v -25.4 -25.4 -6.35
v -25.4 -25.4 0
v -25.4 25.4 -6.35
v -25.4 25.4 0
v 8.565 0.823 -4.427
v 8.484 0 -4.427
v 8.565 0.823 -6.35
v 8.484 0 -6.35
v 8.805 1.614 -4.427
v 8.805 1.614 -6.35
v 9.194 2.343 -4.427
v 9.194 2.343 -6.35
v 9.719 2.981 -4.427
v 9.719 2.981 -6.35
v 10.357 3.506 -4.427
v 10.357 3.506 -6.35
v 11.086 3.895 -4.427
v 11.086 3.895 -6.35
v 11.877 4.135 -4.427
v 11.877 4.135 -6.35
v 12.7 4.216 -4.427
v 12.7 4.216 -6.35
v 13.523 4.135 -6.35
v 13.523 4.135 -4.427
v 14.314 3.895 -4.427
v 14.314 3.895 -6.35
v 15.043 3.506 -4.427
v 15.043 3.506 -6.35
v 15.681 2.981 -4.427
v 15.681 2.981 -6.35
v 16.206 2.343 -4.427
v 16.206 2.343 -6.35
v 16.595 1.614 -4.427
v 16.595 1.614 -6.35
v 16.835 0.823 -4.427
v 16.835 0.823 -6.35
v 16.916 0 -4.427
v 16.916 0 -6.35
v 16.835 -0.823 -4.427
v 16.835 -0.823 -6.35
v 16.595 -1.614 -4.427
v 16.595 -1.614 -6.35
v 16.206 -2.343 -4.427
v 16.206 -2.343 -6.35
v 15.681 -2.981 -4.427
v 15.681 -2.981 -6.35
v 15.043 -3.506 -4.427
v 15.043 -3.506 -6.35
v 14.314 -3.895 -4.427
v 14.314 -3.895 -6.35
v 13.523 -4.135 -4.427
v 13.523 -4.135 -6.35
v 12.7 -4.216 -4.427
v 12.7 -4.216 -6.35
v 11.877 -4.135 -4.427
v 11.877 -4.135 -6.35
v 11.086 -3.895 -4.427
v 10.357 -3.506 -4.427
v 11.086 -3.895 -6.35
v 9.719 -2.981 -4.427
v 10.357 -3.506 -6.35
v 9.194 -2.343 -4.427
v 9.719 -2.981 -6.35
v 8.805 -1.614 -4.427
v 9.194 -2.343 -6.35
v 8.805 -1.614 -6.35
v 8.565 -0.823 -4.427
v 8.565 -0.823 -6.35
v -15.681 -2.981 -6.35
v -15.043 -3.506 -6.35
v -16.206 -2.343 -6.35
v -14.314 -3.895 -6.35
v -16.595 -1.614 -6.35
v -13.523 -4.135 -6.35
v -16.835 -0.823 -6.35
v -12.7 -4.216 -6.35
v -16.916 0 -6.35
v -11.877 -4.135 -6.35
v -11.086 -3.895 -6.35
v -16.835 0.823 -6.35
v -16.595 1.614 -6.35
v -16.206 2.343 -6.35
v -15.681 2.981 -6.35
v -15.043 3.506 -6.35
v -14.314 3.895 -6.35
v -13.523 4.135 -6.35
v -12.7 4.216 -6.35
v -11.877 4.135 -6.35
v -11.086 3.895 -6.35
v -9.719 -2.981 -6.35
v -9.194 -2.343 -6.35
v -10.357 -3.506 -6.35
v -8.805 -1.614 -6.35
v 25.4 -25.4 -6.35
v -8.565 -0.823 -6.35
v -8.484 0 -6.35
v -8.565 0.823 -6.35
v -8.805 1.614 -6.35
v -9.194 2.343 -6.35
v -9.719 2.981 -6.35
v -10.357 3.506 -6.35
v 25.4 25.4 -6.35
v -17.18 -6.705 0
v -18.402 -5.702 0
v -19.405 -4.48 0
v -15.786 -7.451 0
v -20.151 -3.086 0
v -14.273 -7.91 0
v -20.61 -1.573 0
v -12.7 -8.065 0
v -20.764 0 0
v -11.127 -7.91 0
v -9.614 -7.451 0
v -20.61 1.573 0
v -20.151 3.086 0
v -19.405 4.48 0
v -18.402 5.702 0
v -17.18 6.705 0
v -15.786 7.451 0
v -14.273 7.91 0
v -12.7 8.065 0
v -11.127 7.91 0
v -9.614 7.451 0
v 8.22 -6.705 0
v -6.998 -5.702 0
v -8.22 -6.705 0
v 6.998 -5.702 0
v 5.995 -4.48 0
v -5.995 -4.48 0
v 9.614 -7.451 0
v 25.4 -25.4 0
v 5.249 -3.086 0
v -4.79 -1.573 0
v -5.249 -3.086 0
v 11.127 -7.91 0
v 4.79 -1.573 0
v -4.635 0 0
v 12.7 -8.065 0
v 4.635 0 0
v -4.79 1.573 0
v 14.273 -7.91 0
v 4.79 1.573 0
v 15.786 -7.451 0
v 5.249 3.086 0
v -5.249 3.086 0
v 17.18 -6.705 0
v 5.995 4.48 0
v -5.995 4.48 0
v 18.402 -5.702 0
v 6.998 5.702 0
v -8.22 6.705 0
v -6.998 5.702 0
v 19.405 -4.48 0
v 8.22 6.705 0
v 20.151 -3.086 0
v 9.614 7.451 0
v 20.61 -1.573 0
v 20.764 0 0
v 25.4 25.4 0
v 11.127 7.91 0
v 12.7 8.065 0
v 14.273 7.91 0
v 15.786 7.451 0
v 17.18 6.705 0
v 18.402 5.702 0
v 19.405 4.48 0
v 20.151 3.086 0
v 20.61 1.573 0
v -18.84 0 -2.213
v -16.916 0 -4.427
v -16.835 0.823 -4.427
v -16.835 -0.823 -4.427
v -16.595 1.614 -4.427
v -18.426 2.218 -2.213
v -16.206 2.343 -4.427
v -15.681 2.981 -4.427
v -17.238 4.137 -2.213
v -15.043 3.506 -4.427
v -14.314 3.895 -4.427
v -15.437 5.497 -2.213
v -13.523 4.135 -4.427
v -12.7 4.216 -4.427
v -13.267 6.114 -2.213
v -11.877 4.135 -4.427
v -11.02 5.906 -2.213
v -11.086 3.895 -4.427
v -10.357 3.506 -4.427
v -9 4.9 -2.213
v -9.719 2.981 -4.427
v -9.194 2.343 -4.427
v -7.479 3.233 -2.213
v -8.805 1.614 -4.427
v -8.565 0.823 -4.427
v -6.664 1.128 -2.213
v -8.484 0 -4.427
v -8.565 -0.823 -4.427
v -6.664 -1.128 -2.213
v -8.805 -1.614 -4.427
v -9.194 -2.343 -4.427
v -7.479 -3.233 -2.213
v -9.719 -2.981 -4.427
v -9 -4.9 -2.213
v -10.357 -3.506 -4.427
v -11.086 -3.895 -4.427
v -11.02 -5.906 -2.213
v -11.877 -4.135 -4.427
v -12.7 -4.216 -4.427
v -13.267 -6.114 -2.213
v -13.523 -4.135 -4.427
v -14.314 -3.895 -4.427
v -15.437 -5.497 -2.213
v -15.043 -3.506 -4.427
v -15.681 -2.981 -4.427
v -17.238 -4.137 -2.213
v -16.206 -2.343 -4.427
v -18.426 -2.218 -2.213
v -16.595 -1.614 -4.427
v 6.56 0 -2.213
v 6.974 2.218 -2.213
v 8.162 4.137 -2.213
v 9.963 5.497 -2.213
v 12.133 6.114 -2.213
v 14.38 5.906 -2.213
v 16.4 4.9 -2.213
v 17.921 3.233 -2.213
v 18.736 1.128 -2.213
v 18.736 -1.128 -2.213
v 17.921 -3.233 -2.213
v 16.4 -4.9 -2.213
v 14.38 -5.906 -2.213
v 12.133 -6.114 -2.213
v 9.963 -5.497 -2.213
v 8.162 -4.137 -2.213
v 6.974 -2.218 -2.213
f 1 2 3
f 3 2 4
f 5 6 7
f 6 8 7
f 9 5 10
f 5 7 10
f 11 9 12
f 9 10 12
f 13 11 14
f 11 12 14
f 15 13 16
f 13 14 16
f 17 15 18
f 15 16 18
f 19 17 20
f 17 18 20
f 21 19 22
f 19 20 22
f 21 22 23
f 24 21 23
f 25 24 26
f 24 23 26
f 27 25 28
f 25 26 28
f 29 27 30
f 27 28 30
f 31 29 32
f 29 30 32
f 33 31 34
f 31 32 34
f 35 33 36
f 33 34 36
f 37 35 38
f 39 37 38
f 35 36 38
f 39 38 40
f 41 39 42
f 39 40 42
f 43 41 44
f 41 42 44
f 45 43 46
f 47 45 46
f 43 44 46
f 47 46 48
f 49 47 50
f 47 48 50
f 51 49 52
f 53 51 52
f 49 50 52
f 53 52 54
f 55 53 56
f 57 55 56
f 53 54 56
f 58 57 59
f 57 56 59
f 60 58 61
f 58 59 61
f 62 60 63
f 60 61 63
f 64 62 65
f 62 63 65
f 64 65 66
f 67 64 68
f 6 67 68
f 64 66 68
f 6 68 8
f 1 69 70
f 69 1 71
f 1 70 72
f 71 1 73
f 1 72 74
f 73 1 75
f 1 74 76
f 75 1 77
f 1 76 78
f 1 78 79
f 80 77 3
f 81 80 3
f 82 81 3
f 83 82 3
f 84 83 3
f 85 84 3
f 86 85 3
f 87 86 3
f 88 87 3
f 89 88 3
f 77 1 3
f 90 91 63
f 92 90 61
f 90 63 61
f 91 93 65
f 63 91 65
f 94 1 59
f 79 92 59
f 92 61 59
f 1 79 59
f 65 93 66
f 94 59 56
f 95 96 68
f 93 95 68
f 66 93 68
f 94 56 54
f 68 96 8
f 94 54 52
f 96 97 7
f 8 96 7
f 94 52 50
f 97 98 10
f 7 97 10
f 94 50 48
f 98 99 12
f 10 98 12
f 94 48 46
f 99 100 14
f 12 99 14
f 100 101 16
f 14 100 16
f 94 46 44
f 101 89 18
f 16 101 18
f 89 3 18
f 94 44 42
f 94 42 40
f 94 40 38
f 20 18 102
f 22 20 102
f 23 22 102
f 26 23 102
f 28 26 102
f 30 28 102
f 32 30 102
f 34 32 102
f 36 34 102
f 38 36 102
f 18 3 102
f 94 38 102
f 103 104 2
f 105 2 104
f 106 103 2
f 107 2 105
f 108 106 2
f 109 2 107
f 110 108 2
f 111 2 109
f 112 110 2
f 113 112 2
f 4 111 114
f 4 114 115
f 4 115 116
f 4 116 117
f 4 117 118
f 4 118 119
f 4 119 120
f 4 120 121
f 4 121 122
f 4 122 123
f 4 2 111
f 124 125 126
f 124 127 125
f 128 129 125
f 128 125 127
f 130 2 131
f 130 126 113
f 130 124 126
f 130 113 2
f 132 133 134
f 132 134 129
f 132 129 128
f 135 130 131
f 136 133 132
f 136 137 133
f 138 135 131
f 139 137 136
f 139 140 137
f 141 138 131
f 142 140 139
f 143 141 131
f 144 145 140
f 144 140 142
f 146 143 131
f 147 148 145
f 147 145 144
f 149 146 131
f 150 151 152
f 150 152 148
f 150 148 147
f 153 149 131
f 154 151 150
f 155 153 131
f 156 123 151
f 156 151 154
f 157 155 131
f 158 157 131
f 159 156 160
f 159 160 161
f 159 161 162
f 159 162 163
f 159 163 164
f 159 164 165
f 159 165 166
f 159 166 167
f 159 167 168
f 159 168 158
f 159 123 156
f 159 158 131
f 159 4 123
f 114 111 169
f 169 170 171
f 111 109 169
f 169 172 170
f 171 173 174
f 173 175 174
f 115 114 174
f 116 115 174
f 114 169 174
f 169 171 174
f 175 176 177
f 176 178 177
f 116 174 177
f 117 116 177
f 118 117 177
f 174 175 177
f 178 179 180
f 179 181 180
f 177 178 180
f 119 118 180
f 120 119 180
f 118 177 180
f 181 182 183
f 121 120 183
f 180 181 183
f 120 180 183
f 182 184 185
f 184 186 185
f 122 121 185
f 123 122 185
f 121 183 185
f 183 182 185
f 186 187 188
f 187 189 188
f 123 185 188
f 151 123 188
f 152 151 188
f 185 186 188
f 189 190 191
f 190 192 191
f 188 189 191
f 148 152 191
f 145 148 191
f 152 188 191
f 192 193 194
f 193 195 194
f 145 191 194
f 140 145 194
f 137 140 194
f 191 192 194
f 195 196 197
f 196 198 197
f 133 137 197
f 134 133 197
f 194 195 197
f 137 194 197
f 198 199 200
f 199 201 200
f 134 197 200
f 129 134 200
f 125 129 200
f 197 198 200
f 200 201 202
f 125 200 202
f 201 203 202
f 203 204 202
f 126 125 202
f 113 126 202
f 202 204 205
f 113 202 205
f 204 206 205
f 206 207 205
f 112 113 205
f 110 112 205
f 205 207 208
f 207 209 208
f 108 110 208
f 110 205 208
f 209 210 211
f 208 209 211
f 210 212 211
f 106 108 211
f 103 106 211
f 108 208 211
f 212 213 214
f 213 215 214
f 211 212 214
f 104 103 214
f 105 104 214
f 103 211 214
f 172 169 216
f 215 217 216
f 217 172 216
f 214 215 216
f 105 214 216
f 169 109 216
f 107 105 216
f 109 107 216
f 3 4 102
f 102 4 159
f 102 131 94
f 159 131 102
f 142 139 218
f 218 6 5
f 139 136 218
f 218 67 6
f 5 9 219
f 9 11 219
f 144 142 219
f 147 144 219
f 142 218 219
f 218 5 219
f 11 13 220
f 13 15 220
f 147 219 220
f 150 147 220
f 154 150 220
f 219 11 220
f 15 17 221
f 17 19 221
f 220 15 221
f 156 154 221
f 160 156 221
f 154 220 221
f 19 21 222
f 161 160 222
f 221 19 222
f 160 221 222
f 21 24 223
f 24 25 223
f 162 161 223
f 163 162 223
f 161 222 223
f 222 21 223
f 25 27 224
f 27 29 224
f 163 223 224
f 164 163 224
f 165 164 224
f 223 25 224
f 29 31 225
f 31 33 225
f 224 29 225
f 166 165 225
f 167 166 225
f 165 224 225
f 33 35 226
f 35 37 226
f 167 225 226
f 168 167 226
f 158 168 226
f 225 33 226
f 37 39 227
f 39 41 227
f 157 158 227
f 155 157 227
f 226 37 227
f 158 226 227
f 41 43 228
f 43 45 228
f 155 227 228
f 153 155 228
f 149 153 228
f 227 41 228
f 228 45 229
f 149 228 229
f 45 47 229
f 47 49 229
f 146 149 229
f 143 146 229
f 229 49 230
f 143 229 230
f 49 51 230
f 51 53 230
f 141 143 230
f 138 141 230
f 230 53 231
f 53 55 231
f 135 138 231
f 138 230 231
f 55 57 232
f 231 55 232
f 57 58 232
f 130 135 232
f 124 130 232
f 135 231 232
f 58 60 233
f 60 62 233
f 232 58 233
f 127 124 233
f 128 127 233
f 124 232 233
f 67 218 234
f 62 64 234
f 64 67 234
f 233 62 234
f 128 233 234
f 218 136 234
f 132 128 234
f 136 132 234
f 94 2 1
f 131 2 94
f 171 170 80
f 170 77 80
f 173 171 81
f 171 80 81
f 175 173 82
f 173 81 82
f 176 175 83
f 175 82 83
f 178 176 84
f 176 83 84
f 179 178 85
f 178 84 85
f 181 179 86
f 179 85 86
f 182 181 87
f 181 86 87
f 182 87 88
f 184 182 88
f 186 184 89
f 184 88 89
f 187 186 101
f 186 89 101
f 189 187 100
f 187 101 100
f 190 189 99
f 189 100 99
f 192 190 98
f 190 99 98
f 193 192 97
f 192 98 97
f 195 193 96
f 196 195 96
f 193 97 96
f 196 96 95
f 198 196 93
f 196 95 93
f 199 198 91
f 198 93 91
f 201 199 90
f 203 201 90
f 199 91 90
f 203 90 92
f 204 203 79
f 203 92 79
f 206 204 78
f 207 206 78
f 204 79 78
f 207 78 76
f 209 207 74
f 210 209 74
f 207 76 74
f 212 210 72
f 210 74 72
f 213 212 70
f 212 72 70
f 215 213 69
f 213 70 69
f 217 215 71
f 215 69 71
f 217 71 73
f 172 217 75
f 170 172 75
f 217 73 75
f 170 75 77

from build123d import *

# Parameters (mm, degrees)
SKETCH1_W                                         = 50.8
SKETCH1_H                                         = 50.8
SKETCH1_R                                         = 3.2639
BOSS_EXTRUDE1_DEPTH                               = 6.35
CSK_FOR_5_16_FLAT_HEAD_MACHINE_SCREW1_D           = 8.4328
CSK_FOR_5_16_FLAT_HEAD_MACHINE_SCREW1_DEPTH       = 32.766
CSK_FOR_5_16_FLAT_HEAD_MACHINE_SCREW1_CSINK_D     = 16.129
CSK_FOR_5_16_FLAT_HEAD_MACHINE_SCREW1_CSINK_ANGLE = 82
CSK_FOR_5_16_FLAT_HEAD_MACHINE_SCREW1_TIP         = 2.533468714


with BuildPart() as part:
    # Sketch1 → Boss-Extrude1 (new body)
    with BuildSketch(Plane.XY):
        Rectangle(SKETCH1_W, SKETCH1_H)
        with Locations((-12.7, 0)):
            Circle(SKETCH1_R, mode=Mode.SUBTRACT)
        with Locations((12.7, 0)):
            Circle(SKETCH1_R, mode=Mode.SUBTRACT)
    extrude(amount=-BOSS_EXTRUDE1_DEPTH)

    # CSK for 5/16 Flat Head Machine Screw1
    with Locations(Plane(origin=(-12.7, 0, 0), x_dir=(1, 0, 0), z_dir=(0, 0, 1))):
        with Locations((0, 0), (25.4, 0)):
            CounterSinkHole(CSK_FOR_5_16_FLAT_HEAD_MACHINE_SCREW1_D / 2, CSK_FOR_5_16_FLAT_HEAD_MACHINE_SCREW1_CSINK_D / 2, depth=CSK_FOR_5_16_FLAT_HEAD_MACHINE_SCREW1_DEPTH, counter_sink_angle=CSK_FOR_5_16_FLAT_HEAD_MACHINE_SCREW1_CSINK_ANGLE)
            with Locations((0, 0, -(CSK_FOR_5_16_FLAT_HEAD_MACHINE_SCREW1_DEPTH + CSK_FOR_5_16_FLAT_HEAD_MACHINE_SCREW1_TIP / 2))):  # 118° drill point
                Cone(0, CSK_FOR_5_16_FLAT_HEAD_MACHINE_SCREW1_D / 2, CSK_FOR_5_16_FLAT_HEAD_MACHINE_SCREW1_TIP, mode=Mode.SUBTRACT)


solid = part.part
